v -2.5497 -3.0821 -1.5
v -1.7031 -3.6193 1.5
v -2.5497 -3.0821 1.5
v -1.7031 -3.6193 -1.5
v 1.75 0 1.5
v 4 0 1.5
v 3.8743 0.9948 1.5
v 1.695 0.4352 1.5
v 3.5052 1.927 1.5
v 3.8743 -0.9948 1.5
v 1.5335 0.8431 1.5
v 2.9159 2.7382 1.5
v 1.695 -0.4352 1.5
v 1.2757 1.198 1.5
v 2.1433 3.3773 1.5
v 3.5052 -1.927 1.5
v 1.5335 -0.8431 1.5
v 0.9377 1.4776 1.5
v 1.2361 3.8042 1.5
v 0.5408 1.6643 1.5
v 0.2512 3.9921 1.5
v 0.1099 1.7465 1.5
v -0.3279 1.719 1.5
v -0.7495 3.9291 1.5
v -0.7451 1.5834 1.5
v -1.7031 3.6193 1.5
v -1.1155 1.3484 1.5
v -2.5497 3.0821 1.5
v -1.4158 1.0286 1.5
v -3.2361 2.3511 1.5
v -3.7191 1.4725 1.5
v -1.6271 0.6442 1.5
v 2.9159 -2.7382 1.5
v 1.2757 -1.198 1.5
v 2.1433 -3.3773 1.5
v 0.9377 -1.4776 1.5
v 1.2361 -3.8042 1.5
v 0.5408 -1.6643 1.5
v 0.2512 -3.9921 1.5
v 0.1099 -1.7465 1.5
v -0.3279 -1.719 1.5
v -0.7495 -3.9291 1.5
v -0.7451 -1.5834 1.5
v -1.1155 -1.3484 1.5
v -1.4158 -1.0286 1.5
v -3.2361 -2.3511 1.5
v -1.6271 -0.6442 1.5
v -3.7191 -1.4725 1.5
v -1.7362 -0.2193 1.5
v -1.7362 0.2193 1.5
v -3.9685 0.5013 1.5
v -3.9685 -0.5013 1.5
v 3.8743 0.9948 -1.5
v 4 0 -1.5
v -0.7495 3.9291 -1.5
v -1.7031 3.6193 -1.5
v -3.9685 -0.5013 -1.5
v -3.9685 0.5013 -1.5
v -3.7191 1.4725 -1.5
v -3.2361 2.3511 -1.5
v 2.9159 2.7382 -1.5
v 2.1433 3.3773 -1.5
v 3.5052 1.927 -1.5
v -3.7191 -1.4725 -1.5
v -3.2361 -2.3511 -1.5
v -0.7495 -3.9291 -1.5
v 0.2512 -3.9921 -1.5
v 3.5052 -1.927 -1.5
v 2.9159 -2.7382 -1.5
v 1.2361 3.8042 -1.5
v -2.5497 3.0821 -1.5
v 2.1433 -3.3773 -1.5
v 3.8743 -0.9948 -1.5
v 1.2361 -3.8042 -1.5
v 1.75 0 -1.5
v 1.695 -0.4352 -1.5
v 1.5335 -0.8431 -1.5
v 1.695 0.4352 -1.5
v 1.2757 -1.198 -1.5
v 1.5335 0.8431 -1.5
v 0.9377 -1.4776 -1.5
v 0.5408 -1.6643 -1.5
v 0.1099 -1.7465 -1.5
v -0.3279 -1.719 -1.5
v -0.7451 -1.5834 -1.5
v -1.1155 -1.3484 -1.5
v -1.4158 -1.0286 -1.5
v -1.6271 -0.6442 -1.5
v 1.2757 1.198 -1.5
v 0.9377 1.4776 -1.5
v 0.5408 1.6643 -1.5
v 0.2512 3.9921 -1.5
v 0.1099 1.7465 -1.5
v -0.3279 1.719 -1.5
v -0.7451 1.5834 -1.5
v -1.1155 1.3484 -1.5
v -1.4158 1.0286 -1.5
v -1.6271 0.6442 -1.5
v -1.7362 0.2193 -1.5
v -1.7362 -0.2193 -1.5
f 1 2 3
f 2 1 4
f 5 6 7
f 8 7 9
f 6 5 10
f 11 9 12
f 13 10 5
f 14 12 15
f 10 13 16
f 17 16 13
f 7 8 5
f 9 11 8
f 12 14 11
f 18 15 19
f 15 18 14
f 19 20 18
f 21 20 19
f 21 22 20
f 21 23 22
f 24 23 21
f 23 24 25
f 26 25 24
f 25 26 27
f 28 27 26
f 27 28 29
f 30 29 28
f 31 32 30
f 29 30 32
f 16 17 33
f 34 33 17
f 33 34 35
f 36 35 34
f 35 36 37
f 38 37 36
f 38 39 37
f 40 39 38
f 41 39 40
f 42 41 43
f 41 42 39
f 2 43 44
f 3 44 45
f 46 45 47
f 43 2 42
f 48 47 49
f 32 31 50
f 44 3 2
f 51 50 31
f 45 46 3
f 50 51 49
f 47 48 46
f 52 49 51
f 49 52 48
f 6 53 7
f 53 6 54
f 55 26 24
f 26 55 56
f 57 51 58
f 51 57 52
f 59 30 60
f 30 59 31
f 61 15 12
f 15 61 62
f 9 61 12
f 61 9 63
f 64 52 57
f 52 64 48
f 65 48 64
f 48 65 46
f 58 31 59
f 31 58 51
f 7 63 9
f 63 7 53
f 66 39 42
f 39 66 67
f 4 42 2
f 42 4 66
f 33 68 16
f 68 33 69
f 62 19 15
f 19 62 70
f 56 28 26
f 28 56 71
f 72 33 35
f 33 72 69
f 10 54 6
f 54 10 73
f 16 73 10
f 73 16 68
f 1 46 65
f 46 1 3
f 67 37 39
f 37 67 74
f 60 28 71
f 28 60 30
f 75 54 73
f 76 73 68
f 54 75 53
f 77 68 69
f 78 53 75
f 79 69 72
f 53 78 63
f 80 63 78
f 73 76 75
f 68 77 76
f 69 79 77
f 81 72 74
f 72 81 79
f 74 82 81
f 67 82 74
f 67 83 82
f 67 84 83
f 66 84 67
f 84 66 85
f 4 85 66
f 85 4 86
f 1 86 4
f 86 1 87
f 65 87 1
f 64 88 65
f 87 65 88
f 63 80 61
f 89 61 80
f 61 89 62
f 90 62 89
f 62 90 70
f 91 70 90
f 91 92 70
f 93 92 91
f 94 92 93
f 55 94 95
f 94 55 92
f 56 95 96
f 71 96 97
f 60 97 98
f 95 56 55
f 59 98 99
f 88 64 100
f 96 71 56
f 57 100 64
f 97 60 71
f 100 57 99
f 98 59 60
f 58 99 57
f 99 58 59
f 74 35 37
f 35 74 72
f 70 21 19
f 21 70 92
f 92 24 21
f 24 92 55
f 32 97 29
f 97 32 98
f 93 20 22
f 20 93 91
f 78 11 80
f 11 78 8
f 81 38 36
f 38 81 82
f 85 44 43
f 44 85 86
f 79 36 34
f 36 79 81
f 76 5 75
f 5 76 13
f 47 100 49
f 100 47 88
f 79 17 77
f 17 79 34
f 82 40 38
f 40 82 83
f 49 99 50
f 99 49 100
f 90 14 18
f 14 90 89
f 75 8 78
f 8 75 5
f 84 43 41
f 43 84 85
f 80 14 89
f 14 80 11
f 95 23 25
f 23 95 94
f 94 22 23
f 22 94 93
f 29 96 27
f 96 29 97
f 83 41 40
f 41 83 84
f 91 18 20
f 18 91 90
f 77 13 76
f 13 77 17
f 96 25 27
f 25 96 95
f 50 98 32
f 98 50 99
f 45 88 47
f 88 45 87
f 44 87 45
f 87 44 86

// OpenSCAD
$fn=25;

module screw_m3(h=20){
    cylinder(d=3, h=h, center=true);
    translate([0, 0, -h/2-1.5])
        difference(){
            cylinder(d=5.5, h=3, center=true);
            translate([0, 0, -0.8])
                cylinder(d=2.8, h=1.8, $fn=6, center=true);
        }
}

module screw_m4(h=20){
    cylinder(d=4, h=h, center=true);
    translate([0, 0, -h/2-2])
        difference(){
            cylinder(d=7, h=4, center=true);
            translate([0, 0, -0.8])
                cylinder(d=3.5, h=2.5, $fn=6, center=true);
        }
}

module nut_m3(){
    difference(){
        cylinder(d=6, h=2.4, $fn=6);
        translate([0, 0, -0.05])
            cylinder(d=3, h=2.5);
    }
}

module nut_m4(){
    difference(){
        cylinder(d=7.6, h=3.2, $fn=6);
        translate([0, 0, -0.05])
            cylinder(d=4, h=3.3);
    }
}

module washer_m3(h){
    difference(){
        cylinder(d=8, h=h, center=true);
        cylinder(d=3.5, h=h+0.1, center=true);
    }
}

washer_m3(3);
